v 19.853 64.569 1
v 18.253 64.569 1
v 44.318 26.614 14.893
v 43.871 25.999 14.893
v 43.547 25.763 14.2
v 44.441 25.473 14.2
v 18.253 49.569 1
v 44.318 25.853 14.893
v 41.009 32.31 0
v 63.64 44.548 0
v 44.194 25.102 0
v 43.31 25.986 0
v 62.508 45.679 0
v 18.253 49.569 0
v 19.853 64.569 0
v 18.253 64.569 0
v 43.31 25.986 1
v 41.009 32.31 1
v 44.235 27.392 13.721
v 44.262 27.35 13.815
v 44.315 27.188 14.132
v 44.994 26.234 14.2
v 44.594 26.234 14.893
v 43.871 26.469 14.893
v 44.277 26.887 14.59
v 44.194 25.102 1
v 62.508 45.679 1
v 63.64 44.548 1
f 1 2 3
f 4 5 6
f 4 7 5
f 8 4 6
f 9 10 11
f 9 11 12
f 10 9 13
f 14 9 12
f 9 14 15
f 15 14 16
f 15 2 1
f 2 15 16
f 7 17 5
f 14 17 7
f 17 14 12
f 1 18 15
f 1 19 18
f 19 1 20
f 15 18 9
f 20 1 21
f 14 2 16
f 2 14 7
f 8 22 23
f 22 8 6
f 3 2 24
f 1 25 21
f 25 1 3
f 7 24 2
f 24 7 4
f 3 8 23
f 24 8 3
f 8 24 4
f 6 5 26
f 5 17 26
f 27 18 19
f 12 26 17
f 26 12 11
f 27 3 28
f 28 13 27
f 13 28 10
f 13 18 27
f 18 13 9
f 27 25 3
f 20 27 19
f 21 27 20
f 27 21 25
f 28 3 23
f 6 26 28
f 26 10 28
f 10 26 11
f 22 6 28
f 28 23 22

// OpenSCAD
// file: microscope_parameters.scad
/******************************************************************
*                                                                 *
* OpenFlexure Microscope: Microscope Parameters                   *
*                                                                 *
* This is the top-level configuration file for the OpenFlexure    *
* microscope, an open microscope and 3-axis translation stage.    *
* It gets really good precision over a ~10mm range, by using      *
* plastic flexure mechanisms.                                     *
*                                                                 *
* Generally I've tried to put parts (or collections of closely    *
* related parts) in their own files.  However, all the parts      *
* depend on the geometry of the microscope - so these parameters  *
* are gathered together here.  In general, the ones you might     *
* to change are towards the top!  Lower-down ones are defined in  *
* terms of higher-up ones - confusion might arise if you redefine *
* these later...                                                  *
*                                                                 *
* (c) Richard Bowman, January 2016                                *
* Released under the CERN Open Hardware License                   *
*                                                                 *
* http://www.github.com/rwb27/openflexure_microscope              *
* http://www.docubricks.com/projects/openflexure-microscope       *
* http://www.waterscope.org                                       *
*                                                                 *
******************************************************************/

d = 0.05;
$fn=32;

// These are the most useful parameters to change!
big_stage = true;
motor_lugs = true;
version_numstring = "5.15.2";

// This sets the basic geometry of the microscope
sample_z = big_stage?65:40; // height of the top of the stage
leg_r = big_stage?30:25; // radius of innermost part of legs
hole_r = big_stage?15:10; // size of hole in the stage
xy_lever_ratio = big_stage?4.0/7.0:1.0; // mechanical advantage of actuator over stage - can be used to trade speed and precision
z_lever_ratio = big_stage?2.4:2.6; // as above, for Z axis (must be >1)
// The variables below affect the position of the objective mount
z_strut_l = big_stage?20:15; //length of struts supporting Z carriage
objective_clip_y = big_stage?12:6; // y position of clip for optics
objective_clip_w = 10; // width of the dovetail clip for the optics
foot_height = 15; //height of the feet (distance from bottom of body to table)

// These variables set the dimensions of flexures
// You might want to tweak them if your material (or printer)
// is different from the ones I've tested, though ABS/PLA extrusion
// is generally fine with my parameters
stage_flex_w = 4; // width of XY axis flexures
zflex_l = 1.5;    // length of (all) flexible bits
zflex_t = 0.75;   // thickness of (all) flexible bits

// Compile a sensible version string
version_string = str("v",version_numstring, big_stage?str("-LS",sample_z):"", motor_lugs?"-M":"");
echo("Compiling OpenFlexure Microscope ",version_string);

stage_t=5; //thickness of the XY stage (at thickest point, most is 1mm less)
flex_z1 = 0;      // z position of lower flexures for XY axis
flex_z2 = sample_z-stage_t; //height of upper XY flexures
z_strut_t = 6;  // (z) thickness of struts for Z axis
z_flex_w = 4;   // width of struts for Z axis
leg = [4,stage_flex_w,flex_z2+zflex_t]; // size of vertical legs
leg_middle_w = 12; // width of the middle part of each leg

leg_outer_w = leg_middle_w + 2*zflex_l + 2*leg[0]; // overall width of parallelogram legs that support the stagef
actuator = [6,(flex_z2 - flex_z1)*xy_lever_ratio,6]; // dimensions of the core part of the actuating levers for X and Y
actuating_nut_r = (flex_z2 - flex_z1)*xy_lever_ratio; // distance from leg_r to the actuating nut/screw for the XY axes
xy_actuator_travel = actuating_nut_r*0.15; // distance moved by XY axis actuators
z_flexure_x = (leg_r-zflex_l-max(5,leg[2]*0.1))*sqrt(2); // x position of the outside of the Z-axis static anchors (either side of the XY stage, on the X axis)
z_flexure_spacing = min(flex_z2-actuator[2]-z_strut_l*0.22-2, 30); // distance between the two sets of flexures on the Z axis
z_carriage = [(z_flexure_x-zflex_l*2-z_strut_l)+d,4,z_flexure_spacing+zflex_t]; //size of the moving block for the Z carriage
z_nut_y = (z_strut_l+zflex_l)*z_lever_ratio+zflex_l/2; // position of Z actuator
z_actuator_travel = z_nut_y*0.15; // distance moved by the Z actuator
z_carriage_y = z_strut_l+2*zflex_l; // y position of moving pivot on Z axis
z_link_w = 4; // width of linking bar between top Z-axis flexure struts
bridge_dz = 10; // spacing between thin links on legs
base_t=1; // thickness of the flat base of the structure
wall_h=15; // height of the stiffening vertical(ish) walls
wall_t=2; //thickness of the stiffening walls
zawall_h = z_flexure_spacing - 5; //height of wall near Z anchor
zbwall_h = z_actuator_travel+z_strut_t+1+2; //height of bridge over Z lever
illumination_clip_y = (-(leg_r-zflex_l-wall_t/2+leg_outer_w/2)/sqrt(2)
                       -wall_t/2-1); //position of clip for
                      // illumination/back foot.  This is set to
                      // coincide with the wall between the back
                      // two legs.
// main file
/*

OpenFlexure Fibre Stage

This project aims to be a high-performance flexure stage, with
short (~2mm) travel and very good accuracy and stability.  It
differs from the microscope by having shorter travel and more
mechanical reduction.  It also has all three axes combined on
one moving stage, rather than separating XY and Z.

*/
use <utilities.scad>;
use <nut_seat_with_flex.scad>;

stage = [37,20,5]; //dimensions of stage part
zflex = [6, 1.5, 0.75]; //dimensions of flexure
xflex = [5,5.5,5]; //default bounding box of x flexure
xflex_t = 1; //thickness of bendy bit in x
flex_a = 0.1; //angle through which flexures are bent, radians
dz = 0.5; //thickness before a bridge is printable-on
xy_stage_reduction = 3; //ratio of sample motion to lower shelf motion
xy_reduction = 5; //mechanical reduction from screw to sample
xy_lever = 10;
xy_travel = xy_lever * flex_a;
xy_bottom_travel = xy_travel * xy_stage_reduction;
xy_column_l = 22; //final part of XY actuators - to allow nut to stay straight
pushstick = [5,35,5]; //cross-section of XY "push stick"
pw = pushstick[0]; //because this is used in a lot of places...
z_lever = 10;
z_travel = z_lever * flex_a;
z_reduction = 5; //mechanical reduction for Z
wall_t = 1.6;
owall_h = pushstick[2] + 1.5 + 1;
d=0.05;

shelf_z1 = xy_lever * xy_stage_reduction;
shelf_z2 = shelf_z1 + xy_lever;

actuator_cross_y = (pw+pushstick[1])*sqrt(2); //if the pushsticks were infinitely long, they'd cross here.
pushstick_anchor_w = 2*(pushstick[1]+pw - xy_lever*xy_stage_reduction - xflex[1]/2); //side length of the square anchor point for the XY pushsticks
z_stage_tip_y = pw/sqrt(2) + xy_bottom_travel * sqrt(2); //position of the pointy end of the Z stage
z_triangle_d = 10; // size of the base of the Z stage
z_anchor_bottom_y = z_stage_tip_y + z_triangle_d + z_lever + zflex[1]; // lower Z stage end of the fixed base

z_pushstick_z = shelf_z1 - pw - 1.5; // height of the Z pushstick
z_pushstick_l = actuator_cross_y - z_anchor_bottom_y + zflex[1];// - pw - zflex[1]; //length of z pushstick, incl. flexures
za_pivot = [pushstick_anchor_w/sqrt(2) + 1.5, z_anchor_bottom_y + z_pushstick_l - zflex[1], 0]; // position of the fixed end of the Z actuator (after, so +y of, the flexure)
z_nut_y = za_pivot[1] + z_lever * z_reduction; // y position of the acutating nut for the Z axis.

xy_column_pivot = [0,actuator_cross_y,0] + [1, -1, 0]*(xy_lever * xy_reduction + pushstick_anchor_w/2 + xflex[1]/2)/sqrt(2); //where the XY "columns" join the actuator
wall_near_xy_column_pivot = xy_column_pivot + [0, (pw/2 + 1.5 + wall_t/2)*sqrt(2), 0] + [1,1,0]*xy_travel*xy_reduction/sqrt(2) + [-1,1,0] * (10-pw)/2/sqrt(2);


module xy_table(){
    // XY table structure (anchors to Z stage)
    // This includes the legs and flexures for the XYZ stage and the
    // bottom part to which the XY actuators connect.
    reflect([1,0,0]) reflect([0,1,0]){
        // legs
        translate([stage[0], stage[1], 0]/2 + [1,1,0]*zflex[1]) cube([1,1,0]*zflex[0] + [0,0,shelf_z2 + stage[2] - 2]);
        
        for(z=[0,shelf_z1, shelf_z2]){
            // bridges between legs
            translate([stage[0]/2+zflex[1],-d,z]){
                cube([zflex[0], zflex[1]+stage[1]/2+2*d, zflex[2]]);
                cube([zflex[0], stage[1]/2+d, stage[2]]);
            }
            //shelves between bridges
            translate([-d,-d,z+2*dz]) cube(stage/2+[0,0,stage[2]/2-2*dz]);
            translate([-d, stage[1]/2-zflex[0], z+dz]) cube([stage[0]/2+zflex[1]+2*d, zflex[0], zflex[2]]);
        }
        translate([-d,-d,0]) cube(stage/2); //bottom sits on z=0
    }
}

module x_flexure(){
    // A flexure that bends along the Z direction, for motion in X
    roc = (xflex[0]-xflex_t)/2;
    difference(){
        translate([0,0,xflex[2]/2]) cube(xflex + [0,2*d,0], center=true);
        
        reflect([1,0,0]) hull() reflect([0,1,0]) reflect([0,0,1]){
            translate(xflex/2 - [0,roc,0]) cylinder(r=roc+d, h=999,$fn=16);
        }
    }
}
module xz_flexure(){
    // Two flexures to allow XZ motion of a beam extending along the Y axis
    w = pw;
    h = pushstick[2];
    // Start with an X flexure
    translate([0,xflex[1]/2,0]) x_flexure();
    sequential_hull(){
        translate([0,xflex[1]+w/8,h/2]) cube([w,w/4,h],center=true);
        translate([-w/2,xflex[1]+w/2,0]) cube([w,d,zflex[2]]);
        translate([-w/2,xflex[1]+w/2+zflex[1],0]) cube([w,d,zflex[2]]);
    }
}
module pushstick(){
    // A beam with 2-axis flexures at either end, to constrain 
    // position in 1D
    w = pw;
    h = pushstick[2];
    l = pushstick[1];
    flex_l = xflex[1]+w/2+zflex[1];
    difference(){
        union(){
            translate([0,l/2,0]) reflect([0,1,0]){
                translate([0,-l/2,0]) xz_flexure();
            }
            translate([-w/2,flex_l,0]) cube([w,l-2*flex_l,h]);
        }
        
    }
}
module xy_actuator(l=xy_lever * xy_reduction){
    // A beam with a fitting for the actuating nut in the end
    // The origin is the middle of the anchor for the initial X
    // flexure.
    w = pw;
    h = pushstick[2];
    difference(){
        union(){
            translate([0,xflex[1]/2,0]) x_flexure();
            translate([-w/2,xflex[1],0]) cube([w,l-xflex[1]/2+xflex[0]/2,h]);
            translate([w/2,xflex[1]/2+l,0]) rotate(-90){
                translate([0,xflex[1]/2,0]) x_flexure();
                translate([-w/2,xflex[1],0]) cube([w,xy_column_l,h]);
                translate([-5,xflex[1]+xy_column_l-10,0]) cube([10,10,h]);
            }
        }
        translate([w/2 + xflex[1]+xy_column_l-7,xflex[1]/2+l,h/2]){
            rotate([0,180,-90]) nut_y(3, top_access=true); 
            rotate([0,0,-90]) translate([0,-xy_column_l + 7 + 0.5, 0]) cylinder_with_45deg_top(r=3/2*1.1, h=2*(xy_column_l - 8), $fn=16, extra_height=0.1);
        }
    }
}
module each_pushstick(){
    // Transformation that creates two pushsticks at 45 degrees
    reflect([1,0,0]) rotate(45) translate([0,pw/2,0]) children();
}

module z_triangle(){
    // Triangle that forms the base of the Z stage
    l = z_triangle_d; //size of the triangle
    hull(){
        translate([0,z_stage_tip_y,0]) cylinder(r=d, h=d, $fn=8);
        reflect([1,0,0]){
            translate([l,z_stage_tip_y+l,0]) cylinder(r=d, h=d, $fn=8);
        }
    }
}

module z_stage(){
    // This is the part that moves in Z only, connected to the middle
    // "shelf" of the XY table
    // The triangular base of this part must fit between the 
    // pushsticks for the XY motion, which constrains the tip position
    // and also means we must bring the sides out at 45 degrees.
    sequential_hull(){
        z_triangle();
        translate([0,0,5]) z_triangle();
        translate([0,0,shelf_z1]) cube([stage[0], stage[1], d],center=true);
        translate([0,0,shelf_z1 + stage[2]/2]) cube(stage,center=true);
    }
    // Join the stage to the anchor with some flexures at the bottom
    reflect([1,0,0]) translate([-z_triangle_d,z_stage_tip_y+z_triangle_d,0]){
        translate([0,-d,0]) cube([zflex[0], z_lever + zflex[1]+2*d, zflex[2]]);
        translate([0,zflex[1],0]) cube([z_triangle_d+d,z_lever - zflex[1], pushstick[2]]);
    }
    // And more flexures at the top
    reflect([1,0,0]) translate([-stage[0]/2,stage[1]/2,shelf_z1]){
        translate([0,-d,0]) cube([zflex[0], z_lever + zflex[1]+2*d, zflex[2]]);
        translate([0,zflex[1],dz]) cube([stage[0]/2+d,z_lever - zflex[1], stage[2]-dz]);
    }
    // The actuating "pushstick" attaches to this lever
    translate([-pw/2, z_stage_tip_y + z_triangle_d + zflex[1], 0]) cube([pw, z_lever - zflex[1], shelf_z1 - 3]);
    // This is the actuating "pushstick"
    translate([-pw/2, z_anchor_bottom_y, z_pushstick_z]){
        cube([pw, z_pushstick_l - 2*zflex[1], pushstick[2]]);
        translate([0,-zflex[1],0]) cube([pw, z_pushstick_l + d, zflex[2]]);
    }
    // The actuating lever pushes/pulls on the above pushstick via
    // the bridge structure below
    reflect([1,0,0]) translate([0, za_pivot[1], 0]) sequential_hull(){
        bx = za_pivot[0];
        w = pw;
        top = z_pushstick_z - pushstick[2]/2; //highest bit
        translate([bx, -zflex[1]-d, 0]) cube([w, w+zflex[1]+d, zflex[2]]);
        translate([bx, 0, 0]) cube([w, w, d]);
        translate([bx, 0, 14+1]) cube([w, w, w/2]);
        translate([bx - (top - 14-1), 0, top]) cube([w, w, w/2]);
        translate([-w/2, 0, top]) cube([w, w, pushstick[2]]);
    }
    // This is the actuating lever itself.
    reflect([1,0,0]) translate([0, za_pivot[1], 0]) sequential_hull(){
        bx = za_pivot[0];
        w = pw;
        h = pushstick[2];
        translate([bx, 0, 0]) cube([w, w, h]);
        translate([bx, w-d, 0]) cube([w, d, 15]);
        translate([-w/2+d, 35, 0]) cube([w, d, h]);
        translate([-w/2+d, z_lever * z_reduction - 5, 0]) cube([w, d, h]);
    }
    // And the column at the end of the actuator...
    translate([0, za_pivot[1] + z_lever * z_reduction, 0]) nut_seat_with_flex();
}

module extrude_then_roof(extrude, roof_extrude){
    union(){
        linear_extrude(extrude+d) children();
        translate([0,0,extrude]) linear_extrude(roof_extrude) hull() children();
    }
}


// Overall structure
module main_body(){
    difference(){
        union(){
            xy_table();
        }
        
        // cutouts for pushsticks
        hull() each_pushstick(){
            h=stage[2]*2+z_travel*2;
            w = pw;
            cube([w, d, h], center=true);
            translate([0,1,0]) cube([w+1, d, h], center=true);
            translate([0, pushstick[1], 0]) cube([w+1+2*xy_bottom_travel*sqrt(2), d, h], center=true);
            translate([0, pushstick[1], 0]) cube([d, d, h + w+1+2*xy_bottom_travel*sqrt(2)], center=true);
        }
        
        // mounting holes on top
        repeat([10,0,0],4,center=true)
            repeat([0,10,0],2,center=true)
            translate([0,0,shelf_z2 + 1]) cylinder(d=3*0.95,h=999);
    }
    // anchor for pushsticks and pushsticks
    translate([0,0,pushstick[2]/2]) rotate(45) cube([pw,pw, pushstick[2]],center=true);
    each_pushstick() pushstick();
    // XY actuating levers
    each_pushstick() translate([xy_lever*xy_stage_reduction + xflex[1]/2, pw/2 + pushstick[1], 0]) rotate(90) xy_actuator();
    // XY screw seats
    reflect([1,0,0]) translate(xy_column_pivot) rotate(-45){
        l = xy_column_l + xflex[1]; //length of column incl. flexure
        yface = l + pw/2; //end of column
        yint = yface + xy_travel * xy_reduction;
        iw = 10 + 3; //internal width of structure
        ow = iw + 2*wall_t; //external width
        difference(){
            extrude_then_roof(owall_h - 1, 1){
                translate([-ow/2, yint]) square([ow, 2]);
                hull(){
                    translate([-iw/2 - 8, yint - l + 1.5]) square([8,d]);
                    translate([-ow/2, yint - l + 1.5]) square([wall_t,l]);
                }
            }
            translate([0,0,pushstick[2]/2]) cylinder_with_45deg_top(r=3/2*1.1, h=999,center=true, extra_height=0.1, $fn=16);
        }
                
    }
    
    // Z stage (the part that moves only in Z)
    z_stage();
    
    extrude_then_roof(owall_h-1,14-owall_h+1){
        // Anchor for the bottom of the Z stage
        hull(){
            bottom_y = z_anchor_bottom_y;
            bottom_tip_y = (pw+pushstick[1]*2)/sqrt(2) - xy_bottom_travel; // Y coordinate of where inside edges of actuators meet
            translate([-z_triangle_d, bottom_y]) square([2*z_triangle_d, bottom_tip_y - bottom_y - z_triangle_d]);
            translate([0,bottom_tip_y]) circle(r=d, $fn=8);
        }
        // Anchor for the XY actuators
        translate([0,actuator_cross_y]) rotate(45) square(pushstick_anchor_w, center=true);
    }
    
    // Anchor for the top of the Z stage
    difference(){
        hull(){ // anchor
            translate([-stage[0]/2,stage[1]/2 + z_lever + zflex[1],shelf_z1]) cube([stage[0], 8, stage[2]]);
            translate([-z_triangle_d, z_anchor_bottom_y, 8]) cube([2*z_triangle_d, 20, d]);
        }
        // clearance for Z actuating lever
        translate([-pw/2-1.5, z_anchor_bottom_y,0]){
            w = pw+3;
            rotate([-asin(flex_a) + 90,0,0]) cube([w, shelf_z1, 999]);
            translate([0,0,shelf_z1 - pushstick[2] - 3]) cube([w, 999, pushstick[2]+3]);
        }
        // mounting holes on top
        translate([0,stage[1]/2 + z_lever + zflex[1]+4,shelf_z1+1]) repeat([10,0,0],4,center=true) cylinder(d=3*0.95,h=999);
    }
    
    // Anchor for Z actuator
    translate([0, za_pivot[1] - zflex[1],0]) sequential_hull(){
        w = 2*(pw + za_pivot[0] + 1.5 + wall_t);
        translate([0,-1,d])cube([w, 2, 2*d], center=true);
        translate([0,-1,8])cube([w, 2, 2*d], center=true);
        translate([0,-4,8+6-d])cube([w, 6, 2*d], center=true);
    }
    translate([-pushstick_anchor_w/sqrt(2),actuator_cross_y,0]) mirror([0,1,0]) cube([pushstick_anchor_w*sqrt(2), actuator_cross_y - za_pivot[1] + zflex[1] + d, 10]);
    
    // Place for the Z screw to sit
    translate([0, z_nut_y, 0]) screw_seat();
    
    // Cover/base structure that holds it all together
    difference(){
        union(){
            //from Z nut seat to XY nut seat
            reflect([1,0,0]) sequential_hull(){
                translate([4.5, z_nut_y, 0]) cube([wall_t,d,12]);
                translate(za_pivot + [pw + 1.5, 15, 0]) cube([wall_t,d,14]);
                translate(za_pivot + [pw + 1.5, -7, 0]) cube([wall_t, 15, 14]);
                //translate(za_pivot + [pw + 1.5 + wall_t/2, -7+wall_t/2, 0]) cylinder(d=wall_t, h=14);
                translate(wall_near_xy_column_pivot) cylinder(d=wall_t, h=owall_h);
            }
            //roof over the Z actuator
            hull() reflect([1,0,0]){
                translate([4.5, z_nut_y, 11]) cube([wall_t,d,1]);
                translate(za_pivot + [pw + 1.5, 15, 14-d]) cube([wall_t,d,1]);
            }
            //from arm near XY actuators to top of Z axis
            reflect([1,0,0]) hull(){
                translate([stage[0]/2-wall_t,stage[1]/2 + z_lever + zflex[1],shelf_z1]) cube([wall_t, 8, 1]);
                translate(wall_near_xy_column_pivot + [0,0,owall_h-1]) cylinder(d=wall_t, h=1);
                translate(za_pivot + [pw + 1.5, -7, 14-1]) cube([wall_t, wall_t, 1]);
            }
            //from arm near XY actuators to bottom of Z axis
            reflect([1,0,0]) hull(){
                translate([z_triangle_d-wall_t,z_anchor_bottom_y,owall_h-1]) cube([wall_t, 8, 1]);
                translate(wall_near_xy_column_pivot + [0,0,owall_h-1]) cylinder(d=wall_t, h=1);
                translate(za_pivot + [pw + 1.5, -7, owall_h-1]) cube([wall_t, wall_t, 1]);
            }
            
        }
        // make sure we clear the Z column
        translate([0,z_nut_y,0]) resize(ss_inner(999)) cylinder(r=10,h=999,$fn=32,center=true);
    }
}//*/

module front_foot(){
    // This glues onto the bottom of the microscope to provide two feet at the front, so it sits flat.  The bottom foot is a standard one from the microscope.
    h1 = 1;
    h = 15;
    foot = wall_near_xy_column_pivot + [0,0,h-wall_t/2];
    hull(){
        translate(za_pivot + [pw + 1.5, -7, 0]) cube([wall_t, 15, h1]);
        translate(wall_near_xy_column_pivot) cylinder(d=wall_t, h=h1);
        translate(foot) sphere(d=wall_t);
    }
    l = xy_column_l + xflex[1]; //length of column incl. flexure
    yface = l + pw/2; //end of column
    yint = yface + xy_travel * xy_reduction;
    iw = 10 + 3; //internal width of structure
    ow = iw + 2*wall_t; //external width
    hull(){
        translate(xy_column_pivot) rotate(-45){
            translate([-iw/2 - 8, yint - l + 1.5, 0]) cube([8,d, h1]);
            translate([-ow/2, yint - l + 1.5, 0]) cube([wall_t,l, h1]);
        }
        translate(foot) sphere(d=wall_t);                
    }
    echo("Front feet at",foot[0],foot[1]);
}
//main_body();
front_foot();
